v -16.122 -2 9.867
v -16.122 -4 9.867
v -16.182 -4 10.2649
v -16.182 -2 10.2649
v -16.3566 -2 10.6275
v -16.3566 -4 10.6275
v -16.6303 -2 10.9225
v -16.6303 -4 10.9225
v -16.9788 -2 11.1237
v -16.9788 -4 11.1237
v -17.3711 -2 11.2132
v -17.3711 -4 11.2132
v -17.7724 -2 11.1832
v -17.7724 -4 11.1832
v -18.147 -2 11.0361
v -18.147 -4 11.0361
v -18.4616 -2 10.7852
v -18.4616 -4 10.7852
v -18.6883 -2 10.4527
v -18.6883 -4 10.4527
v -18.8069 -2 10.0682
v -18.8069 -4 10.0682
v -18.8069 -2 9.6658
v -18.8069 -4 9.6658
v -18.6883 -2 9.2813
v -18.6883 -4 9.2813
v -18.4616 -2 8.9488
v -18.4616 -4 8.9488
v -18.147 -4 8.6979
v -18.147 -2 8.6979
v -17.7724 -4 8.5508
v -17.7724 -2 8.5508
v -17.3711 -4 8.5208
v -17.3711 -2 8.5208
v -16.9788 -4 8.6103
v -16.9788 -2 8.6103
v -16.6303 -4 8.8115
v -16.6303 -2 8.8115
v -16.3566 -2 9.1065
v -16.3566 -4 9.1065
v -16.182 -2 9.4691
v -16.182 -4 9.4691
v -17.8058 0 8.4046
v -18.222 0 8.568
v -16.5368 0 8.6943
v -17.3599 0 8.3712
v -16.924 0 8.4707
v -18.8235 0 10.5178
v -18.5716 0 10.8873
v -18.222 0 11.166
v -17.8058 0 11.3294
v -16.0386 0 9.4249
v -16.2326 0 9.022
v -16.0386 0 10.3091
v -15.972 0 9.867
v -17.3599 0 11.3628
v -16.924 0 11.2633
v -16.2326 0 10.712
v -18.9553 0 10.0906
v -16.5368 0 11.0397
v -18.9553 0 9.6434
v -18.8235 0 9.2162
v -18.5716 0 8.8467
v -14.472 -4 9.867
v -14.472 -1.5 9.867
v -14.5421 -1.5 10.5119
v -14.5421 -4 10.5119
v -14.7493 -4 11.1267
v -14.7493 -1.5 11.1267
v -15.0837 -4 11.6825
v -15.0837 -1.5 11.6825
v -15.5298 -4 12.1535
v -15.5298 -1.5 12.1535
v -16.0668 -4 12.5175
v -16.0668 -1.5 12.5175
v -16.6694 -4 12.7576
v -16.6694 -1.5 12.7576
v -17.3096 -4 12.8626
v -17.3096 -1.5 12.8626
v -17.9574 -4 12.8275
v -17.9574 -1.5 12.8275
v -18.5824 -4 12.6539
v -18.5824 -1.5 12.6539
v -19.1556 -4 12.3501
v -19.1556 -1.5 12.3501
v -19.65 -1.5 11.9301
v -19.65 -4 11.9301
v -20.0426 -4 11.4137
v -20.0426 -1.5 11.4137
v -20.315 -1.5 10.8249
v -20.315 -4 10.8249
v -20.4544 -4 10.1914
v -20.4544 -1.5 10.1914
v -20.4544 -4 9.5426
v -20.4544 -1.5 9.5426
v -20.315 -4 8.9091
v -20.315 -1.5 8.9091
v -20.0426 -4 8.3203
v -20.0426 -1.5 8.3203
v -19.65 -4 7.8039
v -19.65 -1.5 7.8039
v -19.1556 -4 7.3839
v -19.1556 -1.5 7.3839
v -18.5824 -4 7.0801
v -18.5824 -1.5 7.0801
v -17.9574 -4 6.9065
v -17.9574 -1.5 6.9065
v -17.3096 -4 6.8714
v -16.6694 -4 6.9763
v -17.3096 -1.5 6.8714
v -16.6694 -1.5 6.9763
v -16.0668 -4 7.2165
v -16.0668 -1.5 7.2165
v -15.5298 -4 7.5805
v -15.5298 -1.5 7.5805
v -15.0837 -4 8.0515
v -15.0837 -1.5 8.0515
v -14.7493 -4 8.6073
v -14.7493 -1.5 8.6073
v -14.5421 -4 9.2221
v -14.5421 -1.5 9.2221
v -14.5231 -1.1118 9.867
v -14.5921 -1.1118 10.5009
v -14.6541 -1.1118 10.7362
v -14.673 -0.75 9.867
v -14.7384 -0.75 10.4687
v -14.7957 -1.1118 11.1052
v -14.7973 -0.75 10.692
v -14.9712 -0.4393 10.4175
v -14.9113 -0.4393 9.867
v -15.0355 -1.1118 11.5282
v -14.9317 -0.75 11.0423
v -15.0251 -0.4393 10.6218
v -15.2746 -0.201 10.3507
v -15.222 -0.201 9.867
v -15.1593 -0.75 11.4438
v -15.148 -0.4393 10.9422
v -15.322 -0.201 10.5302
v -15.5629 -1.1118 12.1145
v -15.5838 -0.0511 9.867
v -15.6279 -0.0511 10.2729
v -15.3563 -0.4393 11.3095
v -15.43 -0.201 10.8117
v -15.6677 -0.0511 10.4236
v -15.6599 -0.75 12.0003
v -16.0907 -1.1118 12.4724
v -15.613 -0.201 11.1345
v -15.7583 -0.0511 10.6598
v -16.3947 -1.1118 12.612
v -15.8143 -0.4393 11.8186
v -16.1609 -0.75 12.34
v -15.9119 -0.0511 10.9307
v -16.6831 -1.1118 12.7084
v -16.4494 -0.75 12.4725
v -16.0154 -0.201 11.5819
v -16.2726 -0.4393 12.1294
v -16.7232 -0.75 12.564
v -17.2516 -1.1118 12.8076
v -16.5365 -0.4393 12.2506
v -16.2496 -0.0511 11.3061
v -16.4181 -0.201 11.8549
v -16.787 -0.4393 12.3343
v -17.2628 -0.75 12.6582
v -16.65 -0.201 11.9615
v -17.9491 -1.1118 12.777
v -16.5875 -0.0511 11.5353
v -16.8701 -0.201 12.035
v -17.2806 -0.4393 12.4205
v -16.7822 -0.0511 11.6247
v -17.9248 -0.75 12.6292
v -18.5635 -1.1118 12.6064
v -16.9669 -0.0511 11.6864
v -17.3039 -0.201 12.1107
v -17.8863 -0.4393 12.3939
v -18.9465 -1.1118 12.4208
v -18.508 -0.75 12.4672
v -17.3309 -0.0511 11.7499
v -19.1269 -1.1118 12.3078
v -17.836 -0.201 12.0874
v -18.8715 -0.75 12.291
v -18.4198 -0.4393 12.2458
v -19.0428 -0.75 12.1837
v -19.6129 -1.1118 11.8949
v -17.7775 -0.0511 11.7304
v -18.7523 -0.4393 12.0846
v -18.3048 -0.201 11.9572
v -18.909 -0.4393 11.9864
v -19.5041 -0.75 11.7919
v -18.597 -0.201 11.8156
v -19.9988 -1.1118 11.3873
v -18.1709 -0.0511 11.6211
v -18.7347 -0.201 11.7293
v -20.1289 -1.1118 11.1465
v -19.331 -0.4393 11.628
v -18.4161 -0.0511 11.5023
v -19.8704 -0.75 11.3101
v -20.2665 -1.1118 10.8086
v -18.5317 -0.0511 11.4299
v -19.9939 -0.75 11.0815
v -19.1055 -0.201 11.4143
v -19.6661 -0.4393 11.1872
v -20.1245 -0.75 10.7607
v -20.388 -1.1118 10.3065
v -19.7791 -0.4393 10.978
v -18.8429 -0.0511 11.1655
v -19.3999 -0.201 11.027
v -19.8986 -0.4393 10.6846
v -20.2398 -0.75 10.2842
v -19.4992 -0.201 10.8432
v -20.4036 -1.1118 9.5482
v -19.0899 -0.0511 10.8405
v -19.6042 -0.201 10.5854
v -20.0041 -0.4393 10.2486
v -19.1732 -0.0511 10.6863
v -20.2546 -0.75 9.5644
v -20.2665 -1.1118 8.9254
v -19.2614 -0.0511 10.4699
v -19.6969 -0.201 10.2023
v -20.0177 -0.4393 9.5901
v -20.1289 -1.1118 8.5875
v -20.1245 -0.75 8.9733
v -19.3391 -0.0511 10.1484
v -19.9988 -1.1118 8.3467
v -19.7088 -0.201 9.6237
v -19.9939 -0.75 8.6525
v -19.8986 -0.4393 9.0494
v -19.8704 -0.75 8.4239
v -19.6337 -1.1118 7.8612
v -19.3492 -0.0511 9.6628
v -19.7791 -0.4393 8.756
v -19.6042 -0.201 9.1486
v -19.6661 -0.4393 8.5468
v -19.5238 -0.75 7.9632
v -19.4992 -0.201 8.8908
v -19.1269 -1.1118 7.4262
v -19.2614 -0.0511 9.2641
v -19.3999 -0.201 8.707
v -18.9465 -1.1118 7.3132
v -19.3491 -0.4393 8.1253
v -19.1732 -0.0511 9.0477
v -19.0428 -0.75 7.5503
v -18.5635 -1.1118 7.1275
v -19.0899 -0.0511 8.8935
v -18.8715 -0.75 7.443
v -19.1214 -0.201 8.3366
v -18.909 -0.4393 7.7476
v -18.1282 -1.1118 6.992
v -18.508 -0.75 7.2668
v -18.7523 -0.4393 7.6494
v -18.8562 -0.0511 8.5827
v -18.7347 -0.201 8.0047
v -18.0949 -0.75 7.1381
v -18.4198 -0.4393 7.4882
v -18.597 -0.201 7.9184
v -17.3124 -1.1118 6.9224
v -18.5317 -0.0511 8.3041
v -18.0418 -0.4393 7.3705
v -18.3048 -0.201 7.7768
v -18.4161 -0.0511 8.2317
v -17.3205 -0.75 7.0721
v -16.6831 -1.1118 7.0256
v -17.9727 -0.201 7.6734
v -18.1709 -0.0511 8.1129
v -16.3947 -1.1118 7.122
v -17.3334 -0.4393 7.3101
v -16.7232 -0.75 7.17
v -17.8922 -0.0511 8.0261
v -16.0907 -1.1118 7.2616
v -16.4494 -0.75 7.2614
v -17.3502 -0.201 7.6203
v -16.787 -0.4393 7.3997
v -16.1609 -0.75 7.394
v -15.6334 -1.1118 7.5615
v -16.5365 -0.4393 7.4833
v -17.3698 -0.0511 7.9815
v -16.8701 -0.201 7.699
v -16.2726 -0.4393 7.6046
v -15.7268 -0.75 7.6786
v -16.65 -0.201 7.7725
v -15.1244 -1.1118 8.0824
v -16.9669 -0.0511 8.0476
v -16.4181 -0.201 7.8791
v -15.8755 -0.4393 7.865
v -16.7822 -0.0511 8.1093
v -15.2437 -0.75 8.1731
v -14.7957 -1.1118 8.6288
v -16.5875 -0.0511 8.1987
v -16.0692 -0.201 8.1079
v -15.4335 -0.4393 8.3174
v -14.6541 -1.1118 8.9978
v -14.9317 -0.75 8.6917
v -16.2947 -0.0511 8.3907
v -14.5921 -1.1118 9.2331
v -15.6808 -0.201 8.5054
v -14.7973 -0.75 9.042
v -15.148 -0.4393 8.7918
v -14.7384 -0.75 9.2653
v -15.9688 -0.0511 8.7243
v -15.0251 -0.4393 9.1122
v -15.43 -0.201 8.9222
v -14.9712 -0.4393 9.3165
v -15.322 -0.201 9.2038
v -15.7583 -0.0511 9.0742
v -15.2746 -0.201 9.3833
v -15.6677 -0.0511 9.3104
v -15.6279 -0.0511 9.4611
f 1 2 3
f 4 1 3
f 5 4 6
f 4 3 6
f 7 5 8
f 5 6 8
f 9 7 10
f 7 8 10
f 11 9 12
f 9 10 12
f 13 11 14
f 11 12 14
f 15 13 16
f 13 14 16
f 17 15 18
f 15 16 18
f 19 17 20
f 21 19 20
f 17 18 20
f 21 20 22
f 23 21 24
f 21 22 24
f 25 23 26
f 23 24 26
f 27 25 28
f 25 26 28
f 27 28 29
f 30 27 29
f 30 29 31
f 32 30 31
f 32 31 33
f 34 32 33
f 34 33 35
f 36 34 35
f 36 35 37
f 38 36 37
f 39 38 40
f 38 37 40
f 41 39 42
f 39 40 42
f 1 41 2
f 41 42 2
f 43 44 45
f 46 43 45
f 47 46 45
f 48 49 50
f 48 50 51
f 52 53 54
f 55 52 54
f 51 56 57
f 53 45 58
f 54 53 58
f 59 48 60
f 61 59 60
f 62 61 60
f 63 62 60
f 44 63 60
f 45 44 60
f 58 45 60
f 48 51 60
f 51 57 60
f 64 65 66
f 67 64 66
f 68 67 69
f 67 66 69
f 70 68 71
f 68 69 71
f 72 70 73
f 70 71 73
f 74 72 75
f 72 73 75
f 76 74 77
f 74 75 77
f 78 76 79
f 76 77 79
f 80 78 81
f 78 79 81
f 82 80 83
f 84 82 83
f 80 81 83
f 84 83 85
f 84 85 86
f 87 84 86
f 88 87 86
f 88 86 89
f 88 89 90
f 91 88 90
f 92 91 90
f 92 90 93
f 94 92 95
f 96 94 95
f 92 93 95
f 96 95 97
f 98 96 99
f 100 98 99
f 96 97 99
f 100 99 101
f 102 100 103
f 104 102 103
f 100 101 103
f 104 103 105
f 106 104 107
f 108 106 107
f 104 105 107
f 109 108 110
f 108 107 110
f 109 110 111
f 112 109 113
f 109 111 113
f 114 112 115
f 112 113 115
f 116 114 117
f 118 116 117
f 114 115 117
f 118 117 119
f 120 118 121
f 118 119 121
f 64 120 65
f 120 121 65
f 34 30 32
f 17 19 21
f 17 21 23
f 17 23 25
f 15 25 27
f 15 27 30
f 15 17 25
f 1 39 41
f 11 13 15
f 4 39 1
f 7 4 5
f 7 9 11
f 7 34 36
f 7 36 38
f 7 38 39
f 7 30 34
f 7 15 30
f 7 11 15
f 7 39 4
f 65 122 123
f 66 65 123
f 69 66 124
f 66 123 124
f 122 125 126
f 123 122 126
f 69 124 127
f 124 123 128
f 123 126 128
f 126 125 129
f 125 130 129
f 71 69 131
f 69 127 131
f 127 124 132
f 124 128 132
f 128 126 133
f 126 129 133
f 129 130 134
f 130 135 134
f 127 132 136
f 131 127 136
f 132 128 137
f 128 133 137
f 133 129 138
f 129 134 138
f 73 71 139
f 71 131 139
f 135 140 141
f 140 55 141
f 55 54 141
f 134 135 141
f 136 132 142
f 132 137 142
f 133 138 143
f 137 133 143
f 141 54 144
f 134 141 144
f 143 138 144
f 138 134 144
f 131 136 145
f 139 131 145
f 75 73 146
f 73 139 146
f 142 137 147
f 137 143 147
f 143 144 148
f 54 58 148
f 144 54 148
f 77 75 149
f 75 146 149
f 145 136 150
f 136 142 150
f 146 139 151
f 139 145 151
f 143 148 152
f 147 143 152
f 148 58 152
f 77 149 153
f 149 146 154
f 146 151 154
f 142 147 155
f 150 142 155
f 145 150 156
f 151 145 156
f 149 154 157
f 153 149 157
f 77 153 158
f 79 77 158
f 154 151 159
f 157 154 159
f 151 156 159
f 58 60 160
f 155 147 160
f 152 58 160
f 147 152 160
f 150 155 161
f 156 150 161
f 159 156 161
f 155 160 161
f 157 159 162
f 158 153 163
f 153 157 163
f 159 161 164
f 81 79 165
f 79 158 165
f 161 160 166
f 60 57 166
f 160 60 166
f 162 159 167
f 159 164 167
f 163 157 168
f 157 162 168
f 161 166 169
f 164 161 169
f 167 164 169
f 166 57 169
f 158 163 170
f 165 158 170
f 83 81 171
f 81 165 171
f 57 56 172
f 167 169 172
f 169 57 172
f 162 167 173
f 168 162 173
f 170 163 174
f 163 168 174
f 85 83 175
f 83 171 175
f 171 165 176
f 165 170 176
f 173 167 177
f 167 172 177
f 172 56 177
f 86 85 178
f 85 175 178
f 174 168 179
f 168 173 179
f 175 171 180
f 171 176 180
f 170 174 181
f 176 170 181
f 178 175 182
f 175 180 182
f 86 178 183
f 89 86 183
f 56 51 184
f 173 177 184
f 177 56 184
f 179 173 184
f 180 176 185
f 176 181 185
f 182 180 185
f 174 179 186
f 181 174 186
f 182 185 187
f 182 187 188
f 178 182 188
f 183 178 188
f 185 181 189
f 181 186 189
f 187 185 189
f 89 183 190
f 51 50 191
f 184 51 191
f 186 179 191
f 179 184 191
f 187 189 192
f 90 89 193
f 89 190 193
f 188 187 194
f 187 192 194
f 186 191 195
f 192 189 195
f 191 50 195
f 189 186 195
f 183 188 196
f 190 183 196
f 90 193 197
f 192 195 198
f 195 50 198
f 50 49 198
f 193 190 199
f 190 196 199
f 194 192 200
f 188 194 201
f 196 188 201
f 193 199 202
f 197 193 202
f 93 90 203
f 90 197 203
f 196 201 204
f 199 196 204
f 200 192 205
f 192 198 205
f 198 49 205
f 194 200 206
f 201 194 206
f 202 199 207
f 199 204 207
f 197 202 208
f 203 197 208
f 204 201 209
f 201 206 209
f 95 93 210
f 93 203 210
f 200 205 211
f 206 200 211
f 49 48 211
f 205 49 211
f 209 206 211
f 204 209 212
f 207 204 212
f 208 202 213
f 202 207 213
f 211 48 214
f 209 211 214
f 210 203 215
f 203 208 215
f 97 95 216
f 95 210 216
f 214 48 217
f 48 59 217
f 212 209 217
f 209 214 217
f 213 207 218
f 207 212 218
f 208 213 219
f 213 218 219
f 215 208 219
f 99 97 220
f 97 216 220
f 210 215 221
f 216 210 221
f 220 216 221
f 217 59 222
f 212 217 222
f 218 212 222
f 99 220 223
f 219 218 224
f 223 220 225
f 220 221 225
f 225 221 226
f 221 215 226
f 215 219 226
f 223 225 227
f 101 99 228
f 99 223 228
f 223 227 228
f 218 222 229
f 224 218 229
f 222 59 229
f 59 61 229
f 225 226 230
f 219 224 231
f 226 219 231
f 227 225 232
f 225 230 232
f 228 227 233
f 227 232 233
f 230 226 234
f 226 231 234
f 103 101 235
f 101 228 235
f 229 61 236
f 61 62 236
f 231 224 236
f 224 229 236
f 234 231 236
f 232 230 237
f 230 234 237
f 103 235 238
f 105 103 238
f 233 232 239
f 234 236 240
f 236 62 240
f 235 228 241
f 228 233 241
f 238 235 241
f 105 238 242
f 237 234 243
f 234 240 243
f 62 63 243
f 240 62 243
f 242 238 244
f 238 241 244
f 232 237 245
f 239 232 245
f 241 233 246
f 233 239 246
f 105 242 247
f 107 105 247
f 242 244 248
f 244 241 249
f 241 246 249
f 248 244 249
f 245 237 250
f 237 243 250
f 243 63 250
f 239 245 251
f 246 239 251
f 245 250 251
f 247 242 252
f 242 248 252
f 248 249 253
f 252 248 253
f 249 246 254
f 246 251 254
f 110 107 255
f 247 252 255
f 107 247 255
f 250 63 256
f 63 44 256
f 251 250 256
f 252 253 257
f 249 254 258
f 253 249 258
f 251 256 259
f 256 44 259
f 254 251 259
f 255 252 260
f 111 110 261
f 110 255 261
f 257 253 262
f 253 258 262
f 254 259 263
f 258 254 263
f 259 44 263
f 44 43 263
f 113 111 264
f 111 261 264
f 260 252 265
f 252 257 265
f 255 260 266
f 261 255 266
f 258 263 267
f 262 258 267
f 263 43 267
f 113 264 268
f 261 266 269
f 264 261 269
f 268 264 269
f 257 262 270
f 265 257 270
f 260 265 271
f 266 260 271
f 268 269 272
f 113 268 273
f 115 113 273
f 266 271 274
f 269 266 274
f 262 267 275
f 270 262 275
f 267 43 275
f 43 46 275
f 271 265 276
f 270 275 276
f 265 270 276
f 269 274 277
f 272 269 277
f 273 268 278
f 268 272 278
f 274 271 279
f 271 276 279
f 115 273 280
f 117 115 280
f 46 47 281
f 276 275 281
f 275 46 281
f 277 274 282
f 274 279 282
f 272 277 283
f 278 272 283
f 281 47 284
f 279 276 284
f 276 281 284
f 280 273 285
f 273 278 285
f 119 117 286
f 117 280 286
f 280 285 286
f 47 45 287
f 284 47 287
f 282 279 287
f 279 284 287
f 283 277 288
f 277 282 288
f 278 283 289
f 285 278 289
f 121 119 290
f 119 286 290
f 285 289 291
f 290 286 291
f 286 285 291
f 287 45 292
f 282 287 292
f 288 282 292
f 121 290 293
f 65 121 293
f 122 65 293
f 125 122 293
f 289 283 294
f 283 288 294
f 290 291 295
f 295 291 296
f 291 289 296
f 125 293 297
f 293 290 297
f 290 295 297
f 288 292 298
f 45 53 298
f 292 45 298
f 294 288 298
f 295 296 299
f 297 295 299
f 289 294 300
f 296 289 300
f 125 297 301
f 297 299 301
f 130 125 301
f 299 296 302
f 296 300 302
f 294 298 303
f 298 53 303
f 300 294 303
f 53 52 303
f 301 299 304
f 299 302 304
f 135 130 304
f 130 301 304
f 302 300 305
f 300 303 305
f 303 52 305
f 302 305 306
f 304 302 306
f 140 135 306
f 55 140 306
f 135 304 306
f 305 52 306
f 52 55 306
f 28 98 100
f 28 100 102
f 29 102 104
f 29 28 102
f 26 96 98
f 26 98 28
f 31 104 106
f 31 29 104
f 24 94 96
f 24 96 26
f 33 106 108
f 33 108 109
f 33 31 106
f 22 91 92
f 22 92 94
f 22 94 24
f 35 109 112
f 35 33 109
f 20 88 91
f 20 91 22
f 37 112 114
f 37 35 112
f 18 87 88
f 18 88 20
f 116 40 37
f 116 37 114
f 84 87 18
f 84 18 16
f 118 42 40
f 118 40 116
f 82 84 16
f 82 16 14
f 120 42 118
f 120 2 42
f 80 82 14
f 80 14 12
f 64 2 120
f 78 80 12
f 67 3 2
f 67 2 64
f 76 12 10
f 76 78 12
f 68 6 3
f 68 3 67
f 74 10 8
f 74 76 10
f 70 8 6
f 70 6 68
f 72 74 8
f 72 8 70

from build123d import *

# Parameters (mm, degrees)
F0_R     = 3
F1_DEPTH = 4
F2_R     = 1.35
F3_DEPTH = 2
F4_R     = 1.5


with BuildPart() as f1:
    # F0 (on Front) → F1 (new body)
    with BuildSketch(Plane.XZ):
        with Locations((-17.472006, 9.866998)):
            Circle(F0_R)
    extrude(amount=F1_DEPTH)

    # F2 (on face) → F3 (cut)
    with BuildSketch(Plane.XZ.offset(4)):
        with Locations((-17.472006, 9.866998)):
            Circle(F2_R)
    extrude(amount=-F3_DEPTH, mode=Mode.SUBTRACT)

    # F4
    f4_edges = [f1.edges().sort_by_distance(p)[0] for p in [
        (-20.472006, 0, 9.866998),
    ]]
    fillet(f4_edges, radius=F4_R)


solid = f1.part
